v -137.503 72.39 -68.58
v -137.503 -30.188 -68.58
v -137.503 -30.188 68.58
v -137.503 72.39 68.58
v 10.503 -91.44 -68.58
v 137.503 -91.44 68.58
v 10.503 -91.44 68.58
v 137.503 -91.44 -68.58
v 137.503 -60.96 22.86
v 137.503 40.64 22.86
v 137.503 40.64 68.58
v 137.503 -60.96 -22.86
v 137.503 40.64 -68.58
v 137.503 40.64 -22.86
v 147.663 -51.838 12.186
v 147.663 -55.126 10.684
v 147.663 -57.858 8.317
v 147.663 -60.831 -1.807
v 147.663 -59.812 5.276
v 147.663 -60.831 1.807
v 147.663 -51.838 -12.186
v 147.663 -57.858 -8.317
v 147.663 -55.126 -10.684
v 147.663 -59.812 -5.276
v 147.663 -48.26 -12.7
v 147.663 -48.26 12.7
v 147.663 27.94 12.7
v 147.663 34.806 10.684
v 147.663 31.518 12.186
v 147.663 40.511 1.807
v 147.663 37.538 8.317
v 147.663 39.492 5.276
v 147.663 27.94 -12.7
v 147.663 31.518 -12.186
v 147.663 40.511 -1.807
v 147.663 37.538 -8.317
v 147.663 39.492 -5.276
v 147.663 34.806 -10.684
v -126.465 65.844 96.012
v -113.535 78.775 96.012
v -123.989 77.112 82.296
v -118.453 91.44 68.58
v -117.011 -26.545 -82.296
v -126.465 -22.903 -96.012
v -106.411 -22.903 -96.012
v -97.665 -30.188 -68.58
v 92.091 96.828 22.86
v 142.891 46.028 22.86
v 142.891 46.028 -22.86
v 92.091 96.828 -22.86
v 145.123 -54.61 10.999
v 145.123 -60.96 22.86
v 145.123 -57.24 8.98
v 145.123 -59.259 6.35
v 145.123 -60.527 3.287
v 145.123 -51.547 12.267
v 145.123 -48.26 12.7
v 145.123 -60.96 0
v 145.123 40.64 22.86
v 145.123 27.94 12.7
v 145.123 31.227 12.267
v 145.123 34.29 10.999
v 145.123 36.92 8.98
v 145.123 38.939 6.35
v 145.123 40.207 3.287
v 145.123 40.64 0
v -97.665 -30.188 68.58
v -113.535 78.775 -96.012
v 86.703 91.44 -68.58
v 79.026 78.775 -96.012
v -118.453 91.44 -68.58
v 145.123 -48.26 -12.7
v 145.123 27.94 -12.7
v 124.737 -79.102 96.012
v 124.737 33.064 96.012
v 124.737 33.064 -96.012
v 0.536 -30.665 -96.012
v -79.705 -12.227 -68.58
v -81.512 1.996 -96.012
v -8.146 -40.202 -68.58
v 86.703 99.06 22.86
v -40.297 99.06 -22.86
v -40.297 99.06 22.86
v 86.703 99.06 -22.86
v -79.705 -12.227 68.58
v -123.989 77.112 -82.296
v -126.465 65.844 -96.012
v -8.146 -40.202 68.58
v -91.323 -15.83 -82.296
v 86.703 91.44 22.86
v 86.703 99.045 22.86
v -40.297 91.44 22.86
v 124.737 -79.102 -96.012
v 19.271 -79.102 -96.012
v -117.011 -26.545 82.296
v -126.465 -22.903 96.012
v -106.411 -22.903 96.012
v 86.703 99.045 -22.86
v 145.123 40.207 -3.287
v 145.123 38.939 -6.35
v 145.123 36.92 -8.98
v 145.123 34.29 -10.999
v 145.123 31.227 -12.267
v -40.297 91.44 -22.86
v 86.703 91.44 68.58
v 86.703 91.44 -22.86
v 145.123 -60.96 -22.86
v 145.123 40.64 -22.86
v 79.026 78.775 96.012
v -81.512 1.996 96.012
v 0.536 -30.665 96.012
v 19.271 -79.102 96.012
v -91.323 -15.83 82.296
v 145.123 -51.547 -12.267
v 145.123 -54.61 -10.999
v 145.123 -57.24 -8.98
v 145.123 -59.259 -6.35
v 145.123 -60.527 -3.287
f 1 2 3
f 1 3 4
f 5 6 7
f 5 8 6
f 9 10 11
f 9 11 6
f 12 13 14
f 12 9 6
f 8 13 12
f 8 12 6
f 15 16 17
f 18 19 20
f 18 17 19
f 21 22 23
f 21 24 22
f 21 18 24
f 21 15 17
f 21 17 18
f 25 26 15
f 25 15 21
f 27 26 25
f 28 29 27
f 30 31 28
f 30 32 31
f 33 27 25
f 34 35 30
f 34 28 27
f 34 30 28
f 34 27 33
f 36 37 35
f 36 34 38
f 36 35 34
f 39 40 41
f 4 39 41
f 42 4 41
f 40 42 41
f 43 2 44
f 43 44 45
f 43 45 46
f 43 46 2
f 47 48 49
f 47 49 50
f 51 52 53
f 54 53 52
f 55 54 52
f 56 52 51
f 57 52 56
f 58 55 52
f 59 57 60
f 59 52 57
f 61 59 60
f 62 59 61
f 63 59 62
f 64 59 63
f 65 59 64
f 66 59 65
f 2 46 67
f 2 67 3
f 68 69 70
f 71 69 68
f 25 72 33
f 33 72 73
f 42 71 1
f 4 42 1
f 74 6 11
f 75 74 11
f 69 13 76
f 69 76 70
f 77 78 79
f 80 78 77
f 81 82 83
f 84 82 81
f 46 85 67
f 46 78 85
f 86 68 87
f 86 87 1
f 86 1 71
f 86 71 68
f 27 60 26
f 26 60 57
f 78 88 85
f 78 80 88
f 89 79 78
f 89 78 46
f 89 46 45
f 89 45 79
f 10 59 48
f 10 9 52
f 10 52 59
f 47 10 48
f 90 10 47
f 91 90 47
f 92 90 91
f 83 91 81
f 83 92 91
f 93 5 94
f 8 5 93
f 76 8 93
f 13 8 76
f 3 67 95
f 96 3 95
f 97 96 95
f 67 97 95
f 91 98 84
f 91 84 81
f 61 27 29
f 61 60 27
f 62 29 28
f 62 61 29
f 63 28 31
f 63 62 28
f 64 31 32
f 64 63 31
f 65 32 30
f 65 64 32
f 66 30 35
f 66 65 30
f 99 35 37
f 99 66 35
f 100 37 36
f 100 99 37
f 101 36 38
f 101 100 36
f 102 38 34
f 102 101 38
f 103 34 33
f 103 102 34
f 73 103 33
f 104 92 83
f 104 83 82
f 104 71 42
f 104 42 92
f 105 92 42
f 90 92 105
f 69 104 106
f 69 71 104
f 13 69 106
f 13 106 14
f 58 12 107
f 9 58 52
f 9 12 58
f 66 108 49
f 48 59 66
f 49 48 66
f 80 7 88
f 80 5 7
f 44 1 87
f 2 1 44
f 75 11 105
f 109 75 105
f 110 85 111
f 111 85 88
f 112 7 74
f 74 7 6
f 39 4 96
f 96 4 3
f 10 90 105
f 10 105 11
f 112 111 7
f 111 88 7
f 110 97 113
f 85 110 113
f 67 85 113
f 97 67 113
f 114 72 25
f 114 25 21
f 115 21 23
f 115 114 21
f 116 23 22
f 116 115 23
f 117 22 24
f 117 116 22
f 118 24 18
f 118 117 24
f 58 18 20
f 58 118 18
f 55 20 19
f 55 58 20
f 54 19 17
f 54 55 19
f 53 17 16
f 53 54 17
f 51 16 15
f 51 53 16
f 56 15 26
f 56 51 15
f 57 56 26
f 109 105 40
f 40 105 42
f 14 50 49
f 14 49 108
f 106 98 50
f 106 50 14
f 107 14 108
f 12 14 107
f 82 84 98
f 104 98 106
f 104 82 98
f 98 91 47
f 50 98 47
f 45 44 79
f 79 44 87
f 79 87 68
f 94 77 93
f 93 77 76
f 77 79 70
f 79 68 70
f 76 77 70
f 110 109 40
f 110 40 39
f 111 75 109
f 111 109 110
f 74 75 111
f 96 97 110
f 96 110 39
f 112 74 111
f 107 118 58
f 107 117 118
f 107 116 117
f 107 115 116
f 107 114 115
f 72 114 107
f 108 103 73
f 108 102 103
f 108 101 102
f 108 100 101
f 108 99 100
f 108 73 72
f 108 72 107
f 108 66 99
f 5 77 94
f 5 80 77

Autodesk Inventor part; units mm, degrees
ref_plane "YZ Plane" through (0, 0, 0) normal (1, 0, 0) x (0, 1, 0)
sketch "Sketch1" plane through (0, 0, 0) normal (0, 0, 1) x (1, 0, 0)
  line L0 (-118.4529, 91.44) -> (86.7029, 91.44)
  line L1 (137.5029, 40.64) -> (137.5029, -91.44)
  line L2 (137.5029, -91.44) -> (10.5029, -91.44)
  line L3 (-137.5029, -30.1879) -> (-137.5029, 72.39)
  line L4 (-137.5029, 72.39) -> (-137.5029, -30.1879)
  line L5 (86.7029, 91.44) -> (137.5029, 40.64)
  line L6 (-118.4529, 91.44) -> (-137.5029, 72.39)
  line L7 (137.5029, -91.44) -> (10.5029, -91.44)
  line L8 (10.5029, -91.44) -> (-8.146196, -40.20203)
  line L9 (10.5029, -91.44) -> (65.029209, -91.44) construction
  line L10 (-8.146196, -40.20203) -> (-79.70483, -12.227388)
  line L11 (-79.70483, -12.227388) -> (-97.665343, -30.1879)
  line L12 (-97.665343, -30.1879) -> (-137.5029, -30.1879)
extrude "Extrusion1" add sketch "Sketch1" along normal mid plane 137.16
sketch "Sketch2" plane through (0, 0, -68.58) normal (0, 0, -1) x (-1, 0, 0)
  line L0 (-137.5029, 40.64) -> (-137.5029, -91.44)
  line L1 (-137.5029, -91.44) -> (-10.5029, -91.44)
  line L2 (-10.5029, -91.44) -> (8.146196, -40.20203)
  line L3 (8.146196, -40.20203) -> (79.70483, -12.227388)
  line L4 (79.70483, -12.227388) -> (97.665343, -30.1879)
  line L5 (97.665343, -30.1879) -> (137.5029, -30.1879)
  line L6 (137.5029, -30.1879) -> (137.5029, 72.39)
  line L7 (137.5029, 72.39) -> (118.4529, 91.44)
  line L8 (118.4529, 91.44) -> (-86.7029, 91.44)
  line L9 (-86.7029, 91.44) -> (-137.5029, 40.64)
  point P0 (0, 0)
sketch "Sketch3" plane through (0, 0, 68.58) normal (0, 0, 1) x (1, 0, 0)
  line L0 (137.5029, -91.44) -> (137.5029, 40.64)
  line L1 (137.5029, 40.64) -> (86.7029, 91.44)
  line L2 (86.7029, 91.44) -> (-118.4529, 91.44)
  line L3 (-118.4529, 91.44) -> (-137.5029, 72.39)
  line L4 (-137.5029, 72.39) -> (-137.5029, -30.1879)
  line L5 (-137.5029, -30.1879) -> (-97.665343, -30.1879)
  line L6 (-97.665343, -30.1879) -> (-79.70483, -12.227388)
  line L7 (-79.70483, -12.227388) -> (-8.146196, -40.20203)
  line L8 (-8.146196, -40.20203) -> (10.5029, -91.44)
  line L9 (10.5029, -91.44) -> (137.5029, -91.44)
  point P0 (0, 0)
ref_plane "Work Plane1" through (0, 0, 96.012) normal (0, 0, 1) x (1, 0, 0)
ref_plane "Work Plane2" through (0, 0, -96.012) normal (0, 0, -1) x (-1, 0, 0)
sketch "Sketch4" plane through (0, 0, 96.012) normal (0, 0, 1) x (1, 0, 0)
  line L0 (-126.464731, 65.844437) -> (-126.464731, -22.902911)
  line L1 (-126.464731, -22.902911) -> (-106.411156, -22.902911)
  line L2 (-106.411156, -22.902911) -> (-89.052252, -5.544007)
  line L3 (-106.411156, -22.902911) -> (-81.511939, 1.996306)
  line L4 (-81.511939, 1.996306) -> (0.53602, -30.665165)
  line L5 (0.53602, -30.665165) -> (19.270518, -79.10194)
  line L6 (19.270518, -79.10194) -> (124.736838, -79.10194)
  line L7 (124.736838, -79.10194) -> (124.736838, 33.064062)
  line L8 (124.736838, 33.064062) -> (79.026361, 78.774539)
  line L9 (79.026361, 78.774539) -> (-113.534629, 78.774539)
  line L10 (-113.534629, 78.774539) -> (-126.464731, 65.844437)
  point P0 (0, 0)
sketch "Sketch4 outline for Loft1" plane through (0, 0, 96.012) normal (0, 0, 1) x (1, 0, 0)
  line L0 (-113.534629, 78.774539) -> (-126.464731, 65.844437)
  line L1 (79.026361, 78.774539) -> (-113.534629, 78.774539)
  line L2 (124.736838, 33.064062) -> (79.026361, 78.774539)
  line L3 (124.736838, -79.10194) -> (124.736838, 33.064062)
  line L4 (19.270518, -79.10194) -> (124.736838, -79.10194)
  line L5 (0.53602, -30.665165) -> (19.270518, -79.10194)
  line L6 (-81.511939, 1.996306) -> (0.53602, -30.665165)
  line L7 (-106.411156, -22.902911) -> (-81.511939, 1.996306)
  line L8 (-126.464731, -22.902911) -> (-106.411156, -22.902911)
  line L9 (-126.464731, 65.844437) -> (-126.464731, -22.902911)
loft "Loft1" add profiles "Sketch4 outline for Loft1" section 2 edges at (137.5029, -25.4, 68.58) (112.1029, 66.04, 68.58) (-15.875, 91.44, 68.58) (-127.9779, 81.915, 68.58) (-137.5029, 21.10105, 68.58) (-117.584121, -30.1879, 68.58) (-88.685086, -21.207644, 68.58) (-43.925513, -26.214709, 68.58) (1.178352, -65.821015, 68.58) (74.0029, -91.44, 68.58)
sketch "Sketch5" plane through (-113.534629, 78.774539, 96.012) normal (0, 0, 1) x (1, 0, 0)
  line L0 (-12.930103, -12.930103) -> (-12.930103, -101.67745)
  line L1 (-12.930103, -101.67745) -> (7.123473, -101.67745)
  line L2 (7.123473, -101.67745) -> (32.02269, -76.778233)
  line L3 (32.02269, -76.778233) -> (114.070648, -109.439704)
  line L4 (114.070648, -109.439704) -> (132.805147, -157.876479)
  line L5 (132.805147, -157.876479) -> (238.271467, -157.876479)
  line L6 (238.271467, -157.876479) -> (238.271467, -45.710478)
  line L7 (238.271467, -45.710478) -> (192.560989, 0)
  line L8 (192.560989, 0) -> (0, 0)
  line L9 (0, 0) -> (-12.930103, -12.930103)
  point P0 (113.534629, -78.774539)
extrude "Extrusion2" add sketch "Sketch5" against normal blind 192.024
loft "Loft2" add section 1 edges at (-126.464731, 21.470763, -96.012) (-119.99968, 72.309488, -96.012) (-17.254134, 78.774539, -96.012) (101.881599, 55.9193, -96.012) (124.736838, -23.018939, -96.012) (72.003678, -79.10194, -96.012) (9.903269, -54.883552, -96.012) (-40.487959, -14.33443, -96.012) (-93.961547, -10.453303, -96.012) (-116.437944, -22.902911, -96.012) section 2 edges at (137.5029, -25.4, -68.58) (74.0029, -91.44, -68.58) (1.178352, -65.821015, -68.58) (-43.925513, -26.214709, -68.58) (-88.685086, -21.207644, -68.58) (-117.584121, -30.1879, -68.58) (-137.5029, 21.10105, -68.58) (-127.9779, 81.915, -68.58) (-15.875, 91.44, -68.58) (112.1029, 66.04, -68.58)
sketch "Sketch6" plane through (86.7029, 91.44, -68.58) normal (0.7071068, 0.7071068, 0) x (-0.7071068, 0.7071068, 0)
  line L0 (0, 0) -> (0, 137.16)
  line L1 (-71.842049, 0) -> (-71.842049, 137.16)
  line L2 (0, 137.16) -> (0, 91.44)
  line L3 (-71.842049, 0) -> (-71.842049, 45.72)
  line L4 (-71.842049, 45.72) -> (0, 45.72)
  line L5 (0, 45.72) -> (0, 91.44)
  line L6 (0, 91.44) -> (-71.842049, 91.44)
  line L7 (-71.842049, 91.44) -> (-71.842049, 45.72)
  point P0 (-3.349636, 68.58)
  dimension "d44" = 45.72
  dimension "d45" = 45.72
extrude "Extrusion3" add sketch "Sketch6" along normal blind 7.62
sketch "Sketch7" plane through (-118.4529, 91.44, 68.58) normal (0, 1, 0) x (1, 0, 0)
  line L0 (0, 137.16) -> (0, 0) projected
  line L1 (0, 137.16) -> (0, 91.44)
  line L2 (205.1558, 0) -> (205.1558, 45.72)
  line L3 (205.1558, 45.72) -> (78.1558, 45.72)
  line L4 (78.1558, 45.72) -> (78.1558, 91.44)
  line L5 (78.1558, 91.44) -> (205.1558, 91.44)
  line L6 (205.1558, 91.44) -> (205.1558, 45.72)
  point P0 (118.4529, 68.58)
  dimension "d48" = 45.72
  dimension "d49" = 127
extrude "Extrusion4" add sketch "Sketch7" along normal blind 7.62
sketch "Sketch8" plane through (137.5029, -91.44, 68.58) normal (1, 0, 0) x (0, 0, -1)
  line L0 (45.72, 132.08) -> (91.44, 132.08)
  line L1 (91.44, 132.08) -> (91.44, 30.48)
  line L2 (91.44, 30.48) -> (45.72, 30.48)
  line L3 (45.72, 30.48) -> (45.72, 132.08)
  point P0 (68.58, 91.44)
  dimension "d52" = 101.6
extrude "Extrusion5" add sketch "Sketch8" along normal blind 7.62
sketch "Sketch9" plane through (92.091054, 96.828154, -22.86) normal (-0.7071068, 0.7071068, 0) x (-0.7071068, -0.7071068, 0)
  line L0 (7.62, 0) -> (7.62, 45.72) projected
  line L1 (7.62, 45.72) -> (0, 45.72) projected
  line L2 (0, 0) -> (0, 45.72) projected
  line L3 (7.62, 0) -> (0, 0) projected
  point P0 (133.586053, 22.86)
sketch "Sketch10" plane through (142.891054, 46.028154, 22.86) normal (0, 0, 1) x (0.7071068, 0.7071068, 0)
  line L0 (-7.62, 0) -> (-7.62, 71.842049)
  line L1 (-7.62, 0) -> (0, 0)
  line L2 (0, 71.842049) -> (0, 0)
  line L3 (-7.62, 71.842049) -> (0, 71.842049)
  line L4 (-7.62, 71.842049) -> (-2.257751, 77.255983)
  line L5 (-7.62, 0) -> (-2.231846, -5.388154)
  line L6 (-7.62, 0) -> (0, 0) construction
  line L7 (-2.231846, -5.388154) -> (0, 0)
  line L8 (-2.257751, 77.255983) -> (0, 71.842049)
  line L9 (0, 71.842049) -> (0, 0)
  point P0 (-133.586053, 68.492413)
  dimension "d55" = 7.62
  dimension "d56" = 7.62
  dimension "d57" = 45
extrude "Extrusion6" add sketch "Sketch10" against normal blind 45.72
sketch "Sketch11" plane through (145.1229, -91.44, 68.58) normal (1, 0, 0) x (0, 0, -1)
  line L0 (45.72, 30.48) -> (91.44, 30.48) projected
  line L1 (91.44, 132.08) -> (45.72, 132.08) projected
  line L2 (68.58, 132.08) -> (68.58, 30.48) construction
  line L3 (55.88, 119.38) -> (55.88, 43.18)
  line L4 (81.28, 43.18) -> (81.28, 119.38)
  arc A0 (81.28, 119.38) -> (55.88, 119.38) centre (68.58, 119.38) ccw
  arc A1 (55.88, 43.18) -> (81.28, 43.18) centre (68.58, 43.18) ccw
  point P0 (68.58, 91.44)
  point P1 (68.58, 81.28)
  dimension "d60" = 25.4
extrude "Extrusion7" add sketch "Sketch11" along normal blind 2.54
properties part number "Head"
